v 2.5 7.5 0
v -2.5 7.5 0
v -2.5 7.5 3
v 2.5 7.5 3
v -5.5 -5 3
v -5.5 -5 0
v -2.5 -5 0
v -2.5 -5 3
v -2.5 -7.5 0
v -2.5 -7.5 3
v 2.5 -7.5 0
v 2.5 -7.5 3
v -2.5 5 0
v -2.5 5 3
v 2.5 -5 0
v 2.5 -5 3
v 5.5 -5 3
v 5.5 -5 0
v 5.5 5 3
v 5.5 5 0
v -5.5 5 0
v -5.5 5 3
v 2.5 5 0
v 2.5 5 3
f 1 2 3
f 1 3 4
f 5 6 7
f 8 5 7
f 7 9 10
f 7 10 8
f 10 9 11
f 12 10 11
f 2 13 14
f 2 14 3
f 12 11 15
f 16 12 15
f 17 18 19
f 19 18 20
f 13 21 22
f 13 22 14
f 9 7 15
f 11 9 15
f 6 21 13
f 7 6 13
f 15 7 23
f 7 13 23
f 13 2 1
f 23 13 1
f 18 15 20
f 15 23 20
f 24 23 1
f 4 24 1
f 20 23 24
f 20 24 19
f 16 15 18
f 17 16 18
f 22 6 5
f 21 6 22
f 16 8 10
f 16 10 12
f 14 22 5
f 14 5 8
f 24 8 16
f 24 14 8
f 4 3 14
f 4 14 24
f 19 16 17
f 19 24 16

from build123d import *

# Parameters (mm, degrees)
SKETCH_1_W      = 3
SKETCH_1_H      = 10
SKETCH_1_W_2    = 5
SKETCH_1_H_2    = 15
EXTRUDE_1_DEPTH = 3


with BuildPart() as part:
    # 草图1 → 凸台-拉伸1 (new body)
    with BuildSketch(Plane.XY):
        with Locations((-4, 0)):
            Rectangle(SKETCH_1_W, SKETCH_1_H)
        Rectangle(SKETCH_1_W_2, SKETCH_1_H_2)
        with Locations((4, 0)):
            Rectangle(SKETCH_1_W, SKETCH_1_H)
    extrude(amount=EXTRUDE_1_DEPTH)


solid = part.part
